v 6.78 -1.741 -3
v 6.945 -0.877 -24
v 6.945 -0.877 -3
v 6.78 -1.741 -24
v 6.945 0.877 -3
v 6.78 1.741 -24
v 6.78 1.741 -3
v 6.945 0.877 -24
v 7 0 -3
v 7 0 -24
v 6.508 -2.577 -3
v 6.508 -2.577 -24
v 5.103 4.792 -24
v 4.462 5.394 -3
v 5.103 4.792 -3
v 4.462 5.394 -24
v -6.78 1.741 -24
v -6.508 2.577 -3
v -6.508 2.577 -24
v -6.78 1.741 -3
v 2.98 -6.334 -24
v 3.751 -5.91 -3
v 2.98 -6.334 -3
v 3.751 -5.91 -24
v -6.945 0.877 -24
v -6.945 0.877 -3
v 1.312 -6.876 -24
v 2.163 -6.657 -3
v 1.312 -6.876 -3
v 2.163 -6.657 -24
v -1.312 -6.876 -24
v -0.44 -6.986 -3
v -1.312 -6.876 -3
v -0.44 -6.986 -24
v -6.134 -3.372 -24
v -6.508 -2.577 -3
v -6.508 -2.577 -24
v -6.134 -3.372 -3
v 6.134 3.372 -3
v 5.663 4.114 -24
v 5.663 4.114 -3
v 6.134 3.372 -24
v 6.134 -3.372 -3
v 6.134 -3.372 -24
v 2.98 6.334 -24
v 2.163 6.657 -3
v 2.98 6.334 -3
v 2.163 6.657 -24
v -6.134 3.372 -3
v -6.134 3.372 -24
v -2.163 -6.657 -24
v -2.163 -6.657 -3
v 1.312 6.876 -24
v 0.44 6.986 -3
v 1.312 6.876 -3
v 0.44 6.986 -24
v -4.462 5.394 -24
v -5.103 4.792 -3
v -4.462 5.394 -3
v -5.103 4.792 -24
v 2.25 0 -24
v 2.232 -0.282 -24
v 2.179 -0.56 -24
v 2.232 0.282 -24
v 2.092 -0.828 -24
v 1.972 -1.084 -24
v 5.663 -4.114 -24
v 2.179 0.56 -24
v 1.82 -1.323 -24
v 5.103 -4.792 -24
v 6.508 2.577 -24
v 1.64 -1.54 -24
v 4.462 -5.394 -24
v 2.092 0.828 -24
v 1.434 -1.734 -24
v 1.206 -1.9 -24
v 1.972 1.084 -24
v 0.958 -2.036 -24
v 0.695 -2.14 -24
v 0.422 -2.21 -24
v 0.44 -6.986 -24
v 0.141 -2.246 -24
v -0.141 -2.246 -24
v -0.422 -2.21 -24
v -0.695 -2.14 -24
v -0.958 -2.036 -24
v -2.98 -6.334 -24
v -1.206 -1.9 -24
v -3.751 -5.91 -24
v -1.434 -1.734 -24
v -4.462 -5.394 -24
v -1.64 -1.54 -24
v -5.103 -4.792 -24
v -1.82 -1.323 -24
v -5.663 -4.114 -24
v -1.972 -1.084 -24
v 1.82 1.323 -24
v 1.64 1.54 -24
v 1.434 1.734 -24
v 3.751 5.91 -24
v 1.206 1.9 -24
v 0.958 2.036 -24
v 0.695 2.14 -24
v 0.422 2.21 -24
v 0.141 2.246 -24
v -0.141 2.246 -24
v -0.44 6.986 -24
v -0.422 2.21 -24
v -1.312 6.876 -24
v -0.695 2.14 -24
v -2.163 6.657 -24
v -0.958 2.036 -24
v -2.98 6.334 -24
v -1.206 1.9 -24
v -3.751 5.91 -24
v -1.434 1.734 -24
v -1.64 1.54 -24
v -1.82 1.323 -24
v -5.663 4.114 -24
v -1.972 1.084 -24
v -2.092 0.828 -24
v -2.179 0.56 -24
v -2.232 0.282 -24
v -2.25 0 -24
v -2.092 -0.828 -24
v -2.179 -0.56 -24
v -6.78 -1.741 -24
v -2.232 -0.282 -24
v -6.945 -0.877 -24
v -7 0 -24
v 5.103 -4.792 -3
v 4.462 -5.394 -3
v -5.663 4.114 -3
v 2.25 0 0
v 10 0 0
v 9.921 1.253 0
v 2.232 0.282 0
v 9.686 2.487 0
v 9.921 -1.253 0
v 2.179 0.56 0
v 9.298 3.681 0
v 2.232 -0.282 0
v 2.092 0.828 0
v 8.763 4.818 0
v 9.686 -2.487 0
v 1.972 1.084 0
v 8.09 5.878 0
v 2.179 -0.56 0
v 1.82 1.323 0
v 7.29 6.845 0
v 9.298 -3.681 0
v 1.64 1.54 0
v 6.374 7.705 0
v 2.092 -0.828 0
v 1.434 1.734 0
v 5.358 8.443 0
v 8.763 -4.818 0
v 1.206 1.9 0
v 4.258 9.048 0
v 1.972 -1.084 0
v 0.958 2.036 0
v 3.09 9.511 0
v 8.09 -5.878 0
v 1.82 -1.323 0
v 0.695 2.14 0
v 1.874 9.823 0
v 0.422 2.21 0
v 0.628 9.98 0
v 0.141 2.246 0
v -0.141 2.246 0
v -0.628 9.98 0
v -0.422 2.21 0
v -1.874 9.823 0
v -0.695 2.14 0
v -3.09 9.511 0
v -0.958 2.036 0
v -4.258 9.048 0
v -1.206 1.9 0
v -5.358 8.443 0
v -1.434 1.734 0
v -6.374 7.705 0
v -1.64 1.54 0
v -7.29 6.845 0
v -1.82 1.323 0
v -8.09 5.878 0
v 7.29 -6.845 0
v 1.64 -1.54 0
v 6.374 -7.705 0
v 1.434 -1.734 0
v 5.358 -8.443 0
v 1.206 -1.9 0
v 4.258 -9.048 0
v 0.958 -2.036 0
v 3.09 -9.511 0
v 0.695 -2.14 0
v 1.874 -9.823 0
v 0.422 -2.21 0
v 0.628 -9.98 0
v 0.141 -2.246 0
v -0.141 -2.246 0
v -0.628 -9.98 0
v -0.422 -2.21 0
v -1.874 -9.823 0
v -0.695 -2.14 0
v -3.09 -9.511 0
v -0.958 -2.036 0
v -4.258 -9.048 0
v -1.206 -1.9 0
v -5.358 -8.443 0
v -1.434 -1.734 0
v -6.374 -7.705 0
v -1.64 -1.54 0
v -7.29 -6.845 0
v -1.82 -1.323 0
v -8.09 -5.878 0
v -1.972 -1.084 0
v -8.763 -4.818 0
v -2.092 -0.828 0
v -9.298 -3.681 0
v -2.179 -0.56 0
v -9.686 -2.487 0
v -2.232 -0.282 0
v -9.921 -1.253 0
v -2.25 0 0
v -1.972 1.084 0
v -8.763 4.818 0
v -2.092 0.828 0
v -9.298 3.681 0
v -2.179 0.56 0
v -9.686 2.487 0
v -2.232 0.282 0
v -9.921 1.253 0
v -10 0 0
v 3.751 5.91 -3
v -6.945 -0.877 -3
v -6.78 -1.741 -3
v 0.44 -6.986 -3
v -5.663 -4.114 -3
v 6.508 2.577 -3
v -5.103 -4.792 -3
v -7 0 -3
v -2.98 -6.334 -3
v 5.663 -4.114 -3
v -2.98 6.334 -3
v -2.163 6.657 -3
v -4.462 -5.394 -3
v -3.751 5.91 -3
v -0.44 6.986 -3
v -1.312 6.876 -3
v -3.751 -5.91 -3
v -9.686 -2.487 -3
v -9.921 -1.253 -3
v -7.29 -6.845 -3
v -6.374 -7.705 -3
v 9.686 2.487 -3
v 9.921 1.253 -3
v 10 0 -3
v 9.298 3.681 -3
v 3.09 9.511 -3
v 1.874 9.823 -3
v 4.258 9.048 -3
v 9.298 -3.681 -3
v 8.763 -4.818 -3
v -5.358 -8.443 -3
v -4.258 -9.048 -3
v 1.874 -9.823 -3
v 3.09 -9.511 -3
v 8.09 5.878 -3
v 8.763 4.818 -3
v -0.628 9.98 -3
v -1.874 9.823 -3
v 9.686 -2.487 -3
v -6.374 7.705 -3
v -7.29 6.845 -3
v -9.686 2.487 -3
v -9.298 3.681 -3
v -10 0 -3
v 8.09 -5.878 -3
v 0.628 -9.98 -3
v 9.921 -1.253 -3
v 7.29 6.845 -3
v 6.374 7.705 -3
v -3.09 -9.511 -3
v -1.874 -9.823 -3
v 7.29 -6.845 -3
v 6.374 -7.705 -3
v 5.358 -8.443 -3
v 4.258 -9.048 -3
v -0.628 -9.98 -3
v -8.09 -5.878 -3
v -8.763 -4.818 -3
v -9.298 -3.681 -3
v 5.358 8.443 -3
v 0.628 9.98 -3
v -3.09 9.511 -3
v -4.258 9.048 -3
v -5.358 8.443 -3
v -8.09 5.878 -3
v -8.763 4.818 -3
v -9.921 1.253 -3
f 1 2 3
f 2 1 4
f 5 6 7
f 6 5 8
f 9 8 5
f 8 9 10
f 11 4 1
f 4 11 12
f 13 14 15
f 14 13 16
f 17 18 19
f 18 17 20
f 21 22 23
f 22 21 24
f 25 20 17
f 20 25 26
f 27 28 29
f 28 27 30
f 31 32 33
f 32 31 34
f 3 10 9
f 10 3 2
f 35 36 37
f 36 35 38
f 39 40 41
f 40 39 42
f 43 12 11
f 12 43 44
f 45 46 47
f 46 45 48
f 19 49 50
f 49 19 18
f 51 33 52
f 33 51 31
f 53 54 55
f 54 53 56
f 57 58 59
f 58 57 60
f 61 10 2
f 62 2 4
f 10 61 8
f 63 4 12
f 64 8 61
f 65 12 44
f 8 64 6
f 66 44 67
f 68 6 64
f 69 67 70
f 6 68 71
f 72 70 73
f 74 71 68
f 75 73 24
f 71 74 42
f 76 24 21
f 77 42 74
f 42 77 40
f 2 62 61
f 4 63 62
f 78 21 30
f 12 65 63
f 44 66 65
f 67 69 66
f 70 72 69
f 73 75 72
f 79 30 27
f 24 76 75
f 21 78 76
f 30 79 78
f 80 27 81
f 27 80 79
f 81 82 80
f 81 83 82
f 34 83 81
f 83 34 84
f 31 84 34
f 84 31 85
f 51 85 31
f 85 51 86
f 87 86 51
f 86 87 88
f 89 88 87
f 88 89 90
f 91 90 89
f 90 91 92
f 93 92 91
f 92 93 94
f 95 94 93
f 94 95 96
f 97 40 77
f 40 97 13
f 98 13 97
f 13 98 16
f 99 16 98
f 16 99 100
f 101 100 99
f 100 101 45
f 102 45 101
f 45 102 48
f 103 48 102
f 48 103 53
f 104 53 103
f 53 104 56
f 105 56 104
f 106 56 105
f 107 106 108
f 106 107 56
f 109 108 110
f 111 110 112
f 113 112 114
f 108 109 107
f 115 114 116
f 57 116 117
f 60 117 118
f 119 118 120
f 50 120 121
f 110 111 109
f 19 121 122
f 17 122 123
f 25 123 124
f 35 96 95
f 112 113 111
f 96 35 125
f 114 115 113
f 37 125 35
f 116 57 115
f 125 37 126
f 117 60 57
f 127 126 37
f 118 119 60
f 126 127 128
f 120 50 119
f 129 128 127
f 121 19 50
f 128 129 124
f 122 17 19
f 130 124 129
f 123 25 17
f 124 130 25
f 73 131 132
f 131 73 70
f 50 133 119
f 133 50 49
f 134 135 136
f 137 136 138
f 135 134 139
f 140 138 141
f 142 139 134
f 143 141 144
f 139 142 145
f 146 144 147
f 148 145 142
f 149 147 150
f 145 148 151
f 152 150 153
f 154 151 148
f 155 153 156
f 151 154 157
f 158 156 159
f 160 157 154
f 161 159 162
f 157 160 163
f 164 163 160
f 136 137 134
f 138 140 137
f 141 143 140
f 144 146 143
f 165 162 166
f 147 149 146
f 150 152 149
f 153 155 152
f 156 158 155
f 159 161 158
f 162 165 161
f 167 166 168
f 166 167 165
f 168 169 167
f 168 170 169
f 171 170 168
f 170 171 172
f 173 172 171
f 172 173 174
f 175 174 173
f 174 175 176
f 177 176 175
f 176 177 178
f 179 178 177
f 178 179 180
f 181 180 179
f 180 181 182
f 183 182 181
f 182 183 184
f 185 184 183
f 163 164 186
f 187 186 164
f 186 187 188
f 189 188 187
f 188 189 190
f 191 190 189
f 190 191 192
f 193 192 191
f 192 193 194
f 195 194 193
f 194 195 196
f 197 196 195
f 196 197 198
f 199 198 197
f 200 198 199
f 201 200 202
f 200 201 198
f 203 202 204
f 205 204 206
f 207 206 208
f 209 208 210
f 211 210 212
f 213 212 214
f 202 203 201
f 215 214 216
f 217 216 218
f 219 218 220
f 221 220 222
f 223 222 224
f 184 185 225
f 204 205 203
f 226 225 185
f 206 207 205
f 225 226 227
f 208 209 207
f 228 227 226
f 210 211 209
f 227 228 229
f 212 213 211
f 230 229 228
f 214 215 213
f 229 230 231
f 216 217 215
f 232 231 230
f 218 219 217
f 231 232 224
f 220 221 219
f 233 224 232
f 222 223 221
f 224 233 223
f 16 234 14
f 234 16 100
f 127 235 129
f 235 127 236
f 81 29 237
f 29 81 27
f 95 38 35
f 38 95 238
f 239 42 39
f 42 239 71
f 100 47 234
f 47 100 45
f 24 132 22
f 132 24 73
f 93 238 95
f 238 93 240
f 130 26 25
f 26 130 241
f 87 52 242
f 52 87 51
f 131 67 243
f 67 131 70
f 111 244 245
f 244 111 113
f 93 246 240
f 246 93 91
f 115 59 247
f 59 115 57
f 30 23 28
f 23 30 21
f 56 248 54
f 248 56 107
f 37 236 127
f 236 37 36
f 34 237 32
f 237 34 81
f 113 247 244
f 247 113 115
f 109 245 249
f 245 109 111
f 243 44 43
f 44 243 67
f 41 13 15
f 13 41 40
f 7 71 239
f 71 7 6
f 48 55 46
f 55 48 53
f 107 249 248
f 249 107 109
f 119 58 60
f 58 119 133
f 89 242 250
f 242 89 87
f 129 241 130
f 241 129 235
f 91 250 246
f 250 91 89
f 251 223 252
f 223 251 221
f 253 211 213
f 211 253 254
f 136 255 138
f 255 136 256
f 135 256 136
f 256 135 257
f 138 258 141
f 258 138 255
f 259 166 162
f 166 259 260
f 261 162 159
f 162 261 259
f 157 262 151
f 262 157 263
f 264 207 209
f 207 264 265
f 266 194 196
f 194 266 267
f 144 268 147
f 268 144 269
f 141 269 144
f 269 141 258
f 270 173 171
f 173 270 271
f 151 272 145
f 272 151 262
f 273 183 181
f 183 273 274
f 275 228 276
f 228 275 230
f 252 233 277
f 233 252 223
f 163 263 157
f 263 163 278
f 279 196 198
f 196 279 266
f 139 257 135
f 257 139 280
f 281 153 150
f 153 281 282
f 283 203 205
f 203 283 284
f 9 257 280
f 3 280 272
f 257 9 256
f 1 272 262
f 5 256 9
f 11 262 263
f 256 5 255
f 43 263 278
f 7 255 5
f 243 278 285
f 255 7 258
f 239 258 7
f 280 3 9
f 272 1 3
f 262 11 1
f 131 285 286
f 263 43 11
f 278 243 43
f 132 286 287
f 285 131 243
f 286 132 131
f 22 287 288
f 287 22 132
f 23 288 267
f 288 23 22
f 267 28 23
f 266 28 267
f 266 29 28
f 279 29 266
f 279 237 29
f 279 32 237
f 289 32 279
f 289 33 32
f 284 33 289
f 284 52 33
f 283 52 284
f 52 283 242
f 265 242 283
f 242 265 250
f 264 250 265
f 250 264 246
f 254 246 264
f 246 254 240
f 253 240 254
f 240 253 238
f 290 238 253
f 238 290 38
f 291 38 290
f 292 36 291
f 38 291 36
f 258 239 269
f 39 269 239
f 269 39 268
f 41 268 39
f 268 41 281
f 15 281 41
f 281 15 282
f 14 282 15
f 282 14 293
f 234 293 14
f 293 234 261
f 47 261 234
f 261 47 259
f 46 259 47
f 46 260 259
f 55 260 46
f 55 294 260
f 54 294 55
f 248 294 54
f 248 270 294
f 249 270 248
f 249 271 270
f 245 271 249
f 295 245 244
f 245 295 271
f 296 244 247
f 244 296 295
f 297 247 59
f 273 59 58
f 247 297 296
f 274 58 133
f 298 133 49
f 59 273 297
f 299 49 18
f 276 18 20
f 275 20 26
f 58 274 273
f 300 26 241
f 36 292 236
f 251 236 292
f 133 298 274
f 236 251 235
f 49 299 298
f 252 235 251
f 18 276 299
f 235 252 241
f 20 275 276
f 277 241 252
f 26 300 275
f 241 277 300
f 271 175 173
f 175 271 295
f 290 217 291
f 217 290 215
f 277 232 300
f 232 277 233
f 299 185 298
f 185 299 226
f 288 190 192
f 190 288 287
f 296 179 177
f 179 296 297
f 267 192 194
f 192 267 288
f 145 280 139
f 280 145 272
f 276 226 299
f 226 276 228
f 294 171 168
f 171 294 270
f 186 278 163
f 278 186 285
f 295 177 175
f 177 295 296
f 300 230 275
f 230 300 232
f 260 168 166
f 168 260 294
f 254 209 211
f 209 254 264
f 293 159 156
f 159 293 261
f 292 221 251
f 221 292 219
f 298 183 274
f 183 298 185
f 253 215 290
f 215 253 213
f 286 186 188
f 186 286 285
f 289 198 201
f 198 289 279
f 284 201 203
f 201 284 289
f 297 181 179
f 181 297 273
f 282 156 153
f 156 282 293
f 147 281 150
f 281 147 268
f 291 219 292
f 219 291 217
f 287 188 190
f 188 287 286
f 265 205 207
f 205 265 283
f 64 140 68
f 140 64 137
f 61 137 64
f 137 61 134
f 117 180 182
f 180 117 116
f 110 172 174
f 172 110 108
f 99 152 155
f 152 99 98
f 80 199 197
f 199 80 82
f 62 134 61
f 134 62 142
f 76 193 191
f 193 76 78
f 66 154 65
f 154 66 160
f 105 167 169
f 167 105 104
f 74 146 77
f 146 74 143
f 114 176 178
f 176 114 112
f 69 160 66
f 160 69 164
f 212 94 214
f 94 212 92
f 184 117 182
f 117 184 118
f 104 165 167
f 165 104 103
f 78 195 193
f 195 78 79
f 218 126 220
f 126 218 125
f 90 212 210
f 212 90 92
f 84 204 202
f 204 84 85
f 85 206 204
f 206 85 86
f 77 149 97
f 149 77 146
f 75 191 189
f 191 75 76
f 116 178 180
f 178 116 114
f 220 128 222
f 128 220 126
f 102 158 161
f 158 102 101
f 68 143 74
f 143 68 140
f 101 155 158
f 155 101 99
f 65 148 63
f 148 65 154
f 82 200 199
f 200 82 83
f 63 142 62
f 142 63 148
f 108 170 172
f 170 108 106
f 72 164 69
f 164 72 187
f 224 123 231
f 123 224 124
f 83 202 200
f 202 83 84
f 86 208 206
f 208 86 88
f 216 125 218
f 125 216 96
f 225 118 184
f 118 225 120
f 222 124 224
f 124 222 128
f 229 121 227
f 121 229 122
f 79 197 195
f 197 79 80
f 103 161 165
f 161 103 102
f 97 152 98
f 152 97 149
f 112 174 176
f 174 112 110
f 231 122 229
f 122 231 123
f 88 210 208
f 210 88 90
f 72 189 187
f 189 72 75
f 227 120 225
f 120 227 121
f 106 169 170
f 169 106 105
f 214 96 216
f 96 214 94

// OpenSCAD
$fn = 50;


difference() {
	union() {
		translate(v = [0, 0, -24.0000000000]) {
			cylinder(h = 24, r = 7.0000000000);
		}
		translate(v = [0, 0, -3.0000000000]) {
			cylinder(h = 3, r = 10.0000000000);
		}
	}
	union() {
		#translate(v = [0, 0, -24]) {
			cylinder(h = 24, r = 2.2500000000);
		}
	}
}
